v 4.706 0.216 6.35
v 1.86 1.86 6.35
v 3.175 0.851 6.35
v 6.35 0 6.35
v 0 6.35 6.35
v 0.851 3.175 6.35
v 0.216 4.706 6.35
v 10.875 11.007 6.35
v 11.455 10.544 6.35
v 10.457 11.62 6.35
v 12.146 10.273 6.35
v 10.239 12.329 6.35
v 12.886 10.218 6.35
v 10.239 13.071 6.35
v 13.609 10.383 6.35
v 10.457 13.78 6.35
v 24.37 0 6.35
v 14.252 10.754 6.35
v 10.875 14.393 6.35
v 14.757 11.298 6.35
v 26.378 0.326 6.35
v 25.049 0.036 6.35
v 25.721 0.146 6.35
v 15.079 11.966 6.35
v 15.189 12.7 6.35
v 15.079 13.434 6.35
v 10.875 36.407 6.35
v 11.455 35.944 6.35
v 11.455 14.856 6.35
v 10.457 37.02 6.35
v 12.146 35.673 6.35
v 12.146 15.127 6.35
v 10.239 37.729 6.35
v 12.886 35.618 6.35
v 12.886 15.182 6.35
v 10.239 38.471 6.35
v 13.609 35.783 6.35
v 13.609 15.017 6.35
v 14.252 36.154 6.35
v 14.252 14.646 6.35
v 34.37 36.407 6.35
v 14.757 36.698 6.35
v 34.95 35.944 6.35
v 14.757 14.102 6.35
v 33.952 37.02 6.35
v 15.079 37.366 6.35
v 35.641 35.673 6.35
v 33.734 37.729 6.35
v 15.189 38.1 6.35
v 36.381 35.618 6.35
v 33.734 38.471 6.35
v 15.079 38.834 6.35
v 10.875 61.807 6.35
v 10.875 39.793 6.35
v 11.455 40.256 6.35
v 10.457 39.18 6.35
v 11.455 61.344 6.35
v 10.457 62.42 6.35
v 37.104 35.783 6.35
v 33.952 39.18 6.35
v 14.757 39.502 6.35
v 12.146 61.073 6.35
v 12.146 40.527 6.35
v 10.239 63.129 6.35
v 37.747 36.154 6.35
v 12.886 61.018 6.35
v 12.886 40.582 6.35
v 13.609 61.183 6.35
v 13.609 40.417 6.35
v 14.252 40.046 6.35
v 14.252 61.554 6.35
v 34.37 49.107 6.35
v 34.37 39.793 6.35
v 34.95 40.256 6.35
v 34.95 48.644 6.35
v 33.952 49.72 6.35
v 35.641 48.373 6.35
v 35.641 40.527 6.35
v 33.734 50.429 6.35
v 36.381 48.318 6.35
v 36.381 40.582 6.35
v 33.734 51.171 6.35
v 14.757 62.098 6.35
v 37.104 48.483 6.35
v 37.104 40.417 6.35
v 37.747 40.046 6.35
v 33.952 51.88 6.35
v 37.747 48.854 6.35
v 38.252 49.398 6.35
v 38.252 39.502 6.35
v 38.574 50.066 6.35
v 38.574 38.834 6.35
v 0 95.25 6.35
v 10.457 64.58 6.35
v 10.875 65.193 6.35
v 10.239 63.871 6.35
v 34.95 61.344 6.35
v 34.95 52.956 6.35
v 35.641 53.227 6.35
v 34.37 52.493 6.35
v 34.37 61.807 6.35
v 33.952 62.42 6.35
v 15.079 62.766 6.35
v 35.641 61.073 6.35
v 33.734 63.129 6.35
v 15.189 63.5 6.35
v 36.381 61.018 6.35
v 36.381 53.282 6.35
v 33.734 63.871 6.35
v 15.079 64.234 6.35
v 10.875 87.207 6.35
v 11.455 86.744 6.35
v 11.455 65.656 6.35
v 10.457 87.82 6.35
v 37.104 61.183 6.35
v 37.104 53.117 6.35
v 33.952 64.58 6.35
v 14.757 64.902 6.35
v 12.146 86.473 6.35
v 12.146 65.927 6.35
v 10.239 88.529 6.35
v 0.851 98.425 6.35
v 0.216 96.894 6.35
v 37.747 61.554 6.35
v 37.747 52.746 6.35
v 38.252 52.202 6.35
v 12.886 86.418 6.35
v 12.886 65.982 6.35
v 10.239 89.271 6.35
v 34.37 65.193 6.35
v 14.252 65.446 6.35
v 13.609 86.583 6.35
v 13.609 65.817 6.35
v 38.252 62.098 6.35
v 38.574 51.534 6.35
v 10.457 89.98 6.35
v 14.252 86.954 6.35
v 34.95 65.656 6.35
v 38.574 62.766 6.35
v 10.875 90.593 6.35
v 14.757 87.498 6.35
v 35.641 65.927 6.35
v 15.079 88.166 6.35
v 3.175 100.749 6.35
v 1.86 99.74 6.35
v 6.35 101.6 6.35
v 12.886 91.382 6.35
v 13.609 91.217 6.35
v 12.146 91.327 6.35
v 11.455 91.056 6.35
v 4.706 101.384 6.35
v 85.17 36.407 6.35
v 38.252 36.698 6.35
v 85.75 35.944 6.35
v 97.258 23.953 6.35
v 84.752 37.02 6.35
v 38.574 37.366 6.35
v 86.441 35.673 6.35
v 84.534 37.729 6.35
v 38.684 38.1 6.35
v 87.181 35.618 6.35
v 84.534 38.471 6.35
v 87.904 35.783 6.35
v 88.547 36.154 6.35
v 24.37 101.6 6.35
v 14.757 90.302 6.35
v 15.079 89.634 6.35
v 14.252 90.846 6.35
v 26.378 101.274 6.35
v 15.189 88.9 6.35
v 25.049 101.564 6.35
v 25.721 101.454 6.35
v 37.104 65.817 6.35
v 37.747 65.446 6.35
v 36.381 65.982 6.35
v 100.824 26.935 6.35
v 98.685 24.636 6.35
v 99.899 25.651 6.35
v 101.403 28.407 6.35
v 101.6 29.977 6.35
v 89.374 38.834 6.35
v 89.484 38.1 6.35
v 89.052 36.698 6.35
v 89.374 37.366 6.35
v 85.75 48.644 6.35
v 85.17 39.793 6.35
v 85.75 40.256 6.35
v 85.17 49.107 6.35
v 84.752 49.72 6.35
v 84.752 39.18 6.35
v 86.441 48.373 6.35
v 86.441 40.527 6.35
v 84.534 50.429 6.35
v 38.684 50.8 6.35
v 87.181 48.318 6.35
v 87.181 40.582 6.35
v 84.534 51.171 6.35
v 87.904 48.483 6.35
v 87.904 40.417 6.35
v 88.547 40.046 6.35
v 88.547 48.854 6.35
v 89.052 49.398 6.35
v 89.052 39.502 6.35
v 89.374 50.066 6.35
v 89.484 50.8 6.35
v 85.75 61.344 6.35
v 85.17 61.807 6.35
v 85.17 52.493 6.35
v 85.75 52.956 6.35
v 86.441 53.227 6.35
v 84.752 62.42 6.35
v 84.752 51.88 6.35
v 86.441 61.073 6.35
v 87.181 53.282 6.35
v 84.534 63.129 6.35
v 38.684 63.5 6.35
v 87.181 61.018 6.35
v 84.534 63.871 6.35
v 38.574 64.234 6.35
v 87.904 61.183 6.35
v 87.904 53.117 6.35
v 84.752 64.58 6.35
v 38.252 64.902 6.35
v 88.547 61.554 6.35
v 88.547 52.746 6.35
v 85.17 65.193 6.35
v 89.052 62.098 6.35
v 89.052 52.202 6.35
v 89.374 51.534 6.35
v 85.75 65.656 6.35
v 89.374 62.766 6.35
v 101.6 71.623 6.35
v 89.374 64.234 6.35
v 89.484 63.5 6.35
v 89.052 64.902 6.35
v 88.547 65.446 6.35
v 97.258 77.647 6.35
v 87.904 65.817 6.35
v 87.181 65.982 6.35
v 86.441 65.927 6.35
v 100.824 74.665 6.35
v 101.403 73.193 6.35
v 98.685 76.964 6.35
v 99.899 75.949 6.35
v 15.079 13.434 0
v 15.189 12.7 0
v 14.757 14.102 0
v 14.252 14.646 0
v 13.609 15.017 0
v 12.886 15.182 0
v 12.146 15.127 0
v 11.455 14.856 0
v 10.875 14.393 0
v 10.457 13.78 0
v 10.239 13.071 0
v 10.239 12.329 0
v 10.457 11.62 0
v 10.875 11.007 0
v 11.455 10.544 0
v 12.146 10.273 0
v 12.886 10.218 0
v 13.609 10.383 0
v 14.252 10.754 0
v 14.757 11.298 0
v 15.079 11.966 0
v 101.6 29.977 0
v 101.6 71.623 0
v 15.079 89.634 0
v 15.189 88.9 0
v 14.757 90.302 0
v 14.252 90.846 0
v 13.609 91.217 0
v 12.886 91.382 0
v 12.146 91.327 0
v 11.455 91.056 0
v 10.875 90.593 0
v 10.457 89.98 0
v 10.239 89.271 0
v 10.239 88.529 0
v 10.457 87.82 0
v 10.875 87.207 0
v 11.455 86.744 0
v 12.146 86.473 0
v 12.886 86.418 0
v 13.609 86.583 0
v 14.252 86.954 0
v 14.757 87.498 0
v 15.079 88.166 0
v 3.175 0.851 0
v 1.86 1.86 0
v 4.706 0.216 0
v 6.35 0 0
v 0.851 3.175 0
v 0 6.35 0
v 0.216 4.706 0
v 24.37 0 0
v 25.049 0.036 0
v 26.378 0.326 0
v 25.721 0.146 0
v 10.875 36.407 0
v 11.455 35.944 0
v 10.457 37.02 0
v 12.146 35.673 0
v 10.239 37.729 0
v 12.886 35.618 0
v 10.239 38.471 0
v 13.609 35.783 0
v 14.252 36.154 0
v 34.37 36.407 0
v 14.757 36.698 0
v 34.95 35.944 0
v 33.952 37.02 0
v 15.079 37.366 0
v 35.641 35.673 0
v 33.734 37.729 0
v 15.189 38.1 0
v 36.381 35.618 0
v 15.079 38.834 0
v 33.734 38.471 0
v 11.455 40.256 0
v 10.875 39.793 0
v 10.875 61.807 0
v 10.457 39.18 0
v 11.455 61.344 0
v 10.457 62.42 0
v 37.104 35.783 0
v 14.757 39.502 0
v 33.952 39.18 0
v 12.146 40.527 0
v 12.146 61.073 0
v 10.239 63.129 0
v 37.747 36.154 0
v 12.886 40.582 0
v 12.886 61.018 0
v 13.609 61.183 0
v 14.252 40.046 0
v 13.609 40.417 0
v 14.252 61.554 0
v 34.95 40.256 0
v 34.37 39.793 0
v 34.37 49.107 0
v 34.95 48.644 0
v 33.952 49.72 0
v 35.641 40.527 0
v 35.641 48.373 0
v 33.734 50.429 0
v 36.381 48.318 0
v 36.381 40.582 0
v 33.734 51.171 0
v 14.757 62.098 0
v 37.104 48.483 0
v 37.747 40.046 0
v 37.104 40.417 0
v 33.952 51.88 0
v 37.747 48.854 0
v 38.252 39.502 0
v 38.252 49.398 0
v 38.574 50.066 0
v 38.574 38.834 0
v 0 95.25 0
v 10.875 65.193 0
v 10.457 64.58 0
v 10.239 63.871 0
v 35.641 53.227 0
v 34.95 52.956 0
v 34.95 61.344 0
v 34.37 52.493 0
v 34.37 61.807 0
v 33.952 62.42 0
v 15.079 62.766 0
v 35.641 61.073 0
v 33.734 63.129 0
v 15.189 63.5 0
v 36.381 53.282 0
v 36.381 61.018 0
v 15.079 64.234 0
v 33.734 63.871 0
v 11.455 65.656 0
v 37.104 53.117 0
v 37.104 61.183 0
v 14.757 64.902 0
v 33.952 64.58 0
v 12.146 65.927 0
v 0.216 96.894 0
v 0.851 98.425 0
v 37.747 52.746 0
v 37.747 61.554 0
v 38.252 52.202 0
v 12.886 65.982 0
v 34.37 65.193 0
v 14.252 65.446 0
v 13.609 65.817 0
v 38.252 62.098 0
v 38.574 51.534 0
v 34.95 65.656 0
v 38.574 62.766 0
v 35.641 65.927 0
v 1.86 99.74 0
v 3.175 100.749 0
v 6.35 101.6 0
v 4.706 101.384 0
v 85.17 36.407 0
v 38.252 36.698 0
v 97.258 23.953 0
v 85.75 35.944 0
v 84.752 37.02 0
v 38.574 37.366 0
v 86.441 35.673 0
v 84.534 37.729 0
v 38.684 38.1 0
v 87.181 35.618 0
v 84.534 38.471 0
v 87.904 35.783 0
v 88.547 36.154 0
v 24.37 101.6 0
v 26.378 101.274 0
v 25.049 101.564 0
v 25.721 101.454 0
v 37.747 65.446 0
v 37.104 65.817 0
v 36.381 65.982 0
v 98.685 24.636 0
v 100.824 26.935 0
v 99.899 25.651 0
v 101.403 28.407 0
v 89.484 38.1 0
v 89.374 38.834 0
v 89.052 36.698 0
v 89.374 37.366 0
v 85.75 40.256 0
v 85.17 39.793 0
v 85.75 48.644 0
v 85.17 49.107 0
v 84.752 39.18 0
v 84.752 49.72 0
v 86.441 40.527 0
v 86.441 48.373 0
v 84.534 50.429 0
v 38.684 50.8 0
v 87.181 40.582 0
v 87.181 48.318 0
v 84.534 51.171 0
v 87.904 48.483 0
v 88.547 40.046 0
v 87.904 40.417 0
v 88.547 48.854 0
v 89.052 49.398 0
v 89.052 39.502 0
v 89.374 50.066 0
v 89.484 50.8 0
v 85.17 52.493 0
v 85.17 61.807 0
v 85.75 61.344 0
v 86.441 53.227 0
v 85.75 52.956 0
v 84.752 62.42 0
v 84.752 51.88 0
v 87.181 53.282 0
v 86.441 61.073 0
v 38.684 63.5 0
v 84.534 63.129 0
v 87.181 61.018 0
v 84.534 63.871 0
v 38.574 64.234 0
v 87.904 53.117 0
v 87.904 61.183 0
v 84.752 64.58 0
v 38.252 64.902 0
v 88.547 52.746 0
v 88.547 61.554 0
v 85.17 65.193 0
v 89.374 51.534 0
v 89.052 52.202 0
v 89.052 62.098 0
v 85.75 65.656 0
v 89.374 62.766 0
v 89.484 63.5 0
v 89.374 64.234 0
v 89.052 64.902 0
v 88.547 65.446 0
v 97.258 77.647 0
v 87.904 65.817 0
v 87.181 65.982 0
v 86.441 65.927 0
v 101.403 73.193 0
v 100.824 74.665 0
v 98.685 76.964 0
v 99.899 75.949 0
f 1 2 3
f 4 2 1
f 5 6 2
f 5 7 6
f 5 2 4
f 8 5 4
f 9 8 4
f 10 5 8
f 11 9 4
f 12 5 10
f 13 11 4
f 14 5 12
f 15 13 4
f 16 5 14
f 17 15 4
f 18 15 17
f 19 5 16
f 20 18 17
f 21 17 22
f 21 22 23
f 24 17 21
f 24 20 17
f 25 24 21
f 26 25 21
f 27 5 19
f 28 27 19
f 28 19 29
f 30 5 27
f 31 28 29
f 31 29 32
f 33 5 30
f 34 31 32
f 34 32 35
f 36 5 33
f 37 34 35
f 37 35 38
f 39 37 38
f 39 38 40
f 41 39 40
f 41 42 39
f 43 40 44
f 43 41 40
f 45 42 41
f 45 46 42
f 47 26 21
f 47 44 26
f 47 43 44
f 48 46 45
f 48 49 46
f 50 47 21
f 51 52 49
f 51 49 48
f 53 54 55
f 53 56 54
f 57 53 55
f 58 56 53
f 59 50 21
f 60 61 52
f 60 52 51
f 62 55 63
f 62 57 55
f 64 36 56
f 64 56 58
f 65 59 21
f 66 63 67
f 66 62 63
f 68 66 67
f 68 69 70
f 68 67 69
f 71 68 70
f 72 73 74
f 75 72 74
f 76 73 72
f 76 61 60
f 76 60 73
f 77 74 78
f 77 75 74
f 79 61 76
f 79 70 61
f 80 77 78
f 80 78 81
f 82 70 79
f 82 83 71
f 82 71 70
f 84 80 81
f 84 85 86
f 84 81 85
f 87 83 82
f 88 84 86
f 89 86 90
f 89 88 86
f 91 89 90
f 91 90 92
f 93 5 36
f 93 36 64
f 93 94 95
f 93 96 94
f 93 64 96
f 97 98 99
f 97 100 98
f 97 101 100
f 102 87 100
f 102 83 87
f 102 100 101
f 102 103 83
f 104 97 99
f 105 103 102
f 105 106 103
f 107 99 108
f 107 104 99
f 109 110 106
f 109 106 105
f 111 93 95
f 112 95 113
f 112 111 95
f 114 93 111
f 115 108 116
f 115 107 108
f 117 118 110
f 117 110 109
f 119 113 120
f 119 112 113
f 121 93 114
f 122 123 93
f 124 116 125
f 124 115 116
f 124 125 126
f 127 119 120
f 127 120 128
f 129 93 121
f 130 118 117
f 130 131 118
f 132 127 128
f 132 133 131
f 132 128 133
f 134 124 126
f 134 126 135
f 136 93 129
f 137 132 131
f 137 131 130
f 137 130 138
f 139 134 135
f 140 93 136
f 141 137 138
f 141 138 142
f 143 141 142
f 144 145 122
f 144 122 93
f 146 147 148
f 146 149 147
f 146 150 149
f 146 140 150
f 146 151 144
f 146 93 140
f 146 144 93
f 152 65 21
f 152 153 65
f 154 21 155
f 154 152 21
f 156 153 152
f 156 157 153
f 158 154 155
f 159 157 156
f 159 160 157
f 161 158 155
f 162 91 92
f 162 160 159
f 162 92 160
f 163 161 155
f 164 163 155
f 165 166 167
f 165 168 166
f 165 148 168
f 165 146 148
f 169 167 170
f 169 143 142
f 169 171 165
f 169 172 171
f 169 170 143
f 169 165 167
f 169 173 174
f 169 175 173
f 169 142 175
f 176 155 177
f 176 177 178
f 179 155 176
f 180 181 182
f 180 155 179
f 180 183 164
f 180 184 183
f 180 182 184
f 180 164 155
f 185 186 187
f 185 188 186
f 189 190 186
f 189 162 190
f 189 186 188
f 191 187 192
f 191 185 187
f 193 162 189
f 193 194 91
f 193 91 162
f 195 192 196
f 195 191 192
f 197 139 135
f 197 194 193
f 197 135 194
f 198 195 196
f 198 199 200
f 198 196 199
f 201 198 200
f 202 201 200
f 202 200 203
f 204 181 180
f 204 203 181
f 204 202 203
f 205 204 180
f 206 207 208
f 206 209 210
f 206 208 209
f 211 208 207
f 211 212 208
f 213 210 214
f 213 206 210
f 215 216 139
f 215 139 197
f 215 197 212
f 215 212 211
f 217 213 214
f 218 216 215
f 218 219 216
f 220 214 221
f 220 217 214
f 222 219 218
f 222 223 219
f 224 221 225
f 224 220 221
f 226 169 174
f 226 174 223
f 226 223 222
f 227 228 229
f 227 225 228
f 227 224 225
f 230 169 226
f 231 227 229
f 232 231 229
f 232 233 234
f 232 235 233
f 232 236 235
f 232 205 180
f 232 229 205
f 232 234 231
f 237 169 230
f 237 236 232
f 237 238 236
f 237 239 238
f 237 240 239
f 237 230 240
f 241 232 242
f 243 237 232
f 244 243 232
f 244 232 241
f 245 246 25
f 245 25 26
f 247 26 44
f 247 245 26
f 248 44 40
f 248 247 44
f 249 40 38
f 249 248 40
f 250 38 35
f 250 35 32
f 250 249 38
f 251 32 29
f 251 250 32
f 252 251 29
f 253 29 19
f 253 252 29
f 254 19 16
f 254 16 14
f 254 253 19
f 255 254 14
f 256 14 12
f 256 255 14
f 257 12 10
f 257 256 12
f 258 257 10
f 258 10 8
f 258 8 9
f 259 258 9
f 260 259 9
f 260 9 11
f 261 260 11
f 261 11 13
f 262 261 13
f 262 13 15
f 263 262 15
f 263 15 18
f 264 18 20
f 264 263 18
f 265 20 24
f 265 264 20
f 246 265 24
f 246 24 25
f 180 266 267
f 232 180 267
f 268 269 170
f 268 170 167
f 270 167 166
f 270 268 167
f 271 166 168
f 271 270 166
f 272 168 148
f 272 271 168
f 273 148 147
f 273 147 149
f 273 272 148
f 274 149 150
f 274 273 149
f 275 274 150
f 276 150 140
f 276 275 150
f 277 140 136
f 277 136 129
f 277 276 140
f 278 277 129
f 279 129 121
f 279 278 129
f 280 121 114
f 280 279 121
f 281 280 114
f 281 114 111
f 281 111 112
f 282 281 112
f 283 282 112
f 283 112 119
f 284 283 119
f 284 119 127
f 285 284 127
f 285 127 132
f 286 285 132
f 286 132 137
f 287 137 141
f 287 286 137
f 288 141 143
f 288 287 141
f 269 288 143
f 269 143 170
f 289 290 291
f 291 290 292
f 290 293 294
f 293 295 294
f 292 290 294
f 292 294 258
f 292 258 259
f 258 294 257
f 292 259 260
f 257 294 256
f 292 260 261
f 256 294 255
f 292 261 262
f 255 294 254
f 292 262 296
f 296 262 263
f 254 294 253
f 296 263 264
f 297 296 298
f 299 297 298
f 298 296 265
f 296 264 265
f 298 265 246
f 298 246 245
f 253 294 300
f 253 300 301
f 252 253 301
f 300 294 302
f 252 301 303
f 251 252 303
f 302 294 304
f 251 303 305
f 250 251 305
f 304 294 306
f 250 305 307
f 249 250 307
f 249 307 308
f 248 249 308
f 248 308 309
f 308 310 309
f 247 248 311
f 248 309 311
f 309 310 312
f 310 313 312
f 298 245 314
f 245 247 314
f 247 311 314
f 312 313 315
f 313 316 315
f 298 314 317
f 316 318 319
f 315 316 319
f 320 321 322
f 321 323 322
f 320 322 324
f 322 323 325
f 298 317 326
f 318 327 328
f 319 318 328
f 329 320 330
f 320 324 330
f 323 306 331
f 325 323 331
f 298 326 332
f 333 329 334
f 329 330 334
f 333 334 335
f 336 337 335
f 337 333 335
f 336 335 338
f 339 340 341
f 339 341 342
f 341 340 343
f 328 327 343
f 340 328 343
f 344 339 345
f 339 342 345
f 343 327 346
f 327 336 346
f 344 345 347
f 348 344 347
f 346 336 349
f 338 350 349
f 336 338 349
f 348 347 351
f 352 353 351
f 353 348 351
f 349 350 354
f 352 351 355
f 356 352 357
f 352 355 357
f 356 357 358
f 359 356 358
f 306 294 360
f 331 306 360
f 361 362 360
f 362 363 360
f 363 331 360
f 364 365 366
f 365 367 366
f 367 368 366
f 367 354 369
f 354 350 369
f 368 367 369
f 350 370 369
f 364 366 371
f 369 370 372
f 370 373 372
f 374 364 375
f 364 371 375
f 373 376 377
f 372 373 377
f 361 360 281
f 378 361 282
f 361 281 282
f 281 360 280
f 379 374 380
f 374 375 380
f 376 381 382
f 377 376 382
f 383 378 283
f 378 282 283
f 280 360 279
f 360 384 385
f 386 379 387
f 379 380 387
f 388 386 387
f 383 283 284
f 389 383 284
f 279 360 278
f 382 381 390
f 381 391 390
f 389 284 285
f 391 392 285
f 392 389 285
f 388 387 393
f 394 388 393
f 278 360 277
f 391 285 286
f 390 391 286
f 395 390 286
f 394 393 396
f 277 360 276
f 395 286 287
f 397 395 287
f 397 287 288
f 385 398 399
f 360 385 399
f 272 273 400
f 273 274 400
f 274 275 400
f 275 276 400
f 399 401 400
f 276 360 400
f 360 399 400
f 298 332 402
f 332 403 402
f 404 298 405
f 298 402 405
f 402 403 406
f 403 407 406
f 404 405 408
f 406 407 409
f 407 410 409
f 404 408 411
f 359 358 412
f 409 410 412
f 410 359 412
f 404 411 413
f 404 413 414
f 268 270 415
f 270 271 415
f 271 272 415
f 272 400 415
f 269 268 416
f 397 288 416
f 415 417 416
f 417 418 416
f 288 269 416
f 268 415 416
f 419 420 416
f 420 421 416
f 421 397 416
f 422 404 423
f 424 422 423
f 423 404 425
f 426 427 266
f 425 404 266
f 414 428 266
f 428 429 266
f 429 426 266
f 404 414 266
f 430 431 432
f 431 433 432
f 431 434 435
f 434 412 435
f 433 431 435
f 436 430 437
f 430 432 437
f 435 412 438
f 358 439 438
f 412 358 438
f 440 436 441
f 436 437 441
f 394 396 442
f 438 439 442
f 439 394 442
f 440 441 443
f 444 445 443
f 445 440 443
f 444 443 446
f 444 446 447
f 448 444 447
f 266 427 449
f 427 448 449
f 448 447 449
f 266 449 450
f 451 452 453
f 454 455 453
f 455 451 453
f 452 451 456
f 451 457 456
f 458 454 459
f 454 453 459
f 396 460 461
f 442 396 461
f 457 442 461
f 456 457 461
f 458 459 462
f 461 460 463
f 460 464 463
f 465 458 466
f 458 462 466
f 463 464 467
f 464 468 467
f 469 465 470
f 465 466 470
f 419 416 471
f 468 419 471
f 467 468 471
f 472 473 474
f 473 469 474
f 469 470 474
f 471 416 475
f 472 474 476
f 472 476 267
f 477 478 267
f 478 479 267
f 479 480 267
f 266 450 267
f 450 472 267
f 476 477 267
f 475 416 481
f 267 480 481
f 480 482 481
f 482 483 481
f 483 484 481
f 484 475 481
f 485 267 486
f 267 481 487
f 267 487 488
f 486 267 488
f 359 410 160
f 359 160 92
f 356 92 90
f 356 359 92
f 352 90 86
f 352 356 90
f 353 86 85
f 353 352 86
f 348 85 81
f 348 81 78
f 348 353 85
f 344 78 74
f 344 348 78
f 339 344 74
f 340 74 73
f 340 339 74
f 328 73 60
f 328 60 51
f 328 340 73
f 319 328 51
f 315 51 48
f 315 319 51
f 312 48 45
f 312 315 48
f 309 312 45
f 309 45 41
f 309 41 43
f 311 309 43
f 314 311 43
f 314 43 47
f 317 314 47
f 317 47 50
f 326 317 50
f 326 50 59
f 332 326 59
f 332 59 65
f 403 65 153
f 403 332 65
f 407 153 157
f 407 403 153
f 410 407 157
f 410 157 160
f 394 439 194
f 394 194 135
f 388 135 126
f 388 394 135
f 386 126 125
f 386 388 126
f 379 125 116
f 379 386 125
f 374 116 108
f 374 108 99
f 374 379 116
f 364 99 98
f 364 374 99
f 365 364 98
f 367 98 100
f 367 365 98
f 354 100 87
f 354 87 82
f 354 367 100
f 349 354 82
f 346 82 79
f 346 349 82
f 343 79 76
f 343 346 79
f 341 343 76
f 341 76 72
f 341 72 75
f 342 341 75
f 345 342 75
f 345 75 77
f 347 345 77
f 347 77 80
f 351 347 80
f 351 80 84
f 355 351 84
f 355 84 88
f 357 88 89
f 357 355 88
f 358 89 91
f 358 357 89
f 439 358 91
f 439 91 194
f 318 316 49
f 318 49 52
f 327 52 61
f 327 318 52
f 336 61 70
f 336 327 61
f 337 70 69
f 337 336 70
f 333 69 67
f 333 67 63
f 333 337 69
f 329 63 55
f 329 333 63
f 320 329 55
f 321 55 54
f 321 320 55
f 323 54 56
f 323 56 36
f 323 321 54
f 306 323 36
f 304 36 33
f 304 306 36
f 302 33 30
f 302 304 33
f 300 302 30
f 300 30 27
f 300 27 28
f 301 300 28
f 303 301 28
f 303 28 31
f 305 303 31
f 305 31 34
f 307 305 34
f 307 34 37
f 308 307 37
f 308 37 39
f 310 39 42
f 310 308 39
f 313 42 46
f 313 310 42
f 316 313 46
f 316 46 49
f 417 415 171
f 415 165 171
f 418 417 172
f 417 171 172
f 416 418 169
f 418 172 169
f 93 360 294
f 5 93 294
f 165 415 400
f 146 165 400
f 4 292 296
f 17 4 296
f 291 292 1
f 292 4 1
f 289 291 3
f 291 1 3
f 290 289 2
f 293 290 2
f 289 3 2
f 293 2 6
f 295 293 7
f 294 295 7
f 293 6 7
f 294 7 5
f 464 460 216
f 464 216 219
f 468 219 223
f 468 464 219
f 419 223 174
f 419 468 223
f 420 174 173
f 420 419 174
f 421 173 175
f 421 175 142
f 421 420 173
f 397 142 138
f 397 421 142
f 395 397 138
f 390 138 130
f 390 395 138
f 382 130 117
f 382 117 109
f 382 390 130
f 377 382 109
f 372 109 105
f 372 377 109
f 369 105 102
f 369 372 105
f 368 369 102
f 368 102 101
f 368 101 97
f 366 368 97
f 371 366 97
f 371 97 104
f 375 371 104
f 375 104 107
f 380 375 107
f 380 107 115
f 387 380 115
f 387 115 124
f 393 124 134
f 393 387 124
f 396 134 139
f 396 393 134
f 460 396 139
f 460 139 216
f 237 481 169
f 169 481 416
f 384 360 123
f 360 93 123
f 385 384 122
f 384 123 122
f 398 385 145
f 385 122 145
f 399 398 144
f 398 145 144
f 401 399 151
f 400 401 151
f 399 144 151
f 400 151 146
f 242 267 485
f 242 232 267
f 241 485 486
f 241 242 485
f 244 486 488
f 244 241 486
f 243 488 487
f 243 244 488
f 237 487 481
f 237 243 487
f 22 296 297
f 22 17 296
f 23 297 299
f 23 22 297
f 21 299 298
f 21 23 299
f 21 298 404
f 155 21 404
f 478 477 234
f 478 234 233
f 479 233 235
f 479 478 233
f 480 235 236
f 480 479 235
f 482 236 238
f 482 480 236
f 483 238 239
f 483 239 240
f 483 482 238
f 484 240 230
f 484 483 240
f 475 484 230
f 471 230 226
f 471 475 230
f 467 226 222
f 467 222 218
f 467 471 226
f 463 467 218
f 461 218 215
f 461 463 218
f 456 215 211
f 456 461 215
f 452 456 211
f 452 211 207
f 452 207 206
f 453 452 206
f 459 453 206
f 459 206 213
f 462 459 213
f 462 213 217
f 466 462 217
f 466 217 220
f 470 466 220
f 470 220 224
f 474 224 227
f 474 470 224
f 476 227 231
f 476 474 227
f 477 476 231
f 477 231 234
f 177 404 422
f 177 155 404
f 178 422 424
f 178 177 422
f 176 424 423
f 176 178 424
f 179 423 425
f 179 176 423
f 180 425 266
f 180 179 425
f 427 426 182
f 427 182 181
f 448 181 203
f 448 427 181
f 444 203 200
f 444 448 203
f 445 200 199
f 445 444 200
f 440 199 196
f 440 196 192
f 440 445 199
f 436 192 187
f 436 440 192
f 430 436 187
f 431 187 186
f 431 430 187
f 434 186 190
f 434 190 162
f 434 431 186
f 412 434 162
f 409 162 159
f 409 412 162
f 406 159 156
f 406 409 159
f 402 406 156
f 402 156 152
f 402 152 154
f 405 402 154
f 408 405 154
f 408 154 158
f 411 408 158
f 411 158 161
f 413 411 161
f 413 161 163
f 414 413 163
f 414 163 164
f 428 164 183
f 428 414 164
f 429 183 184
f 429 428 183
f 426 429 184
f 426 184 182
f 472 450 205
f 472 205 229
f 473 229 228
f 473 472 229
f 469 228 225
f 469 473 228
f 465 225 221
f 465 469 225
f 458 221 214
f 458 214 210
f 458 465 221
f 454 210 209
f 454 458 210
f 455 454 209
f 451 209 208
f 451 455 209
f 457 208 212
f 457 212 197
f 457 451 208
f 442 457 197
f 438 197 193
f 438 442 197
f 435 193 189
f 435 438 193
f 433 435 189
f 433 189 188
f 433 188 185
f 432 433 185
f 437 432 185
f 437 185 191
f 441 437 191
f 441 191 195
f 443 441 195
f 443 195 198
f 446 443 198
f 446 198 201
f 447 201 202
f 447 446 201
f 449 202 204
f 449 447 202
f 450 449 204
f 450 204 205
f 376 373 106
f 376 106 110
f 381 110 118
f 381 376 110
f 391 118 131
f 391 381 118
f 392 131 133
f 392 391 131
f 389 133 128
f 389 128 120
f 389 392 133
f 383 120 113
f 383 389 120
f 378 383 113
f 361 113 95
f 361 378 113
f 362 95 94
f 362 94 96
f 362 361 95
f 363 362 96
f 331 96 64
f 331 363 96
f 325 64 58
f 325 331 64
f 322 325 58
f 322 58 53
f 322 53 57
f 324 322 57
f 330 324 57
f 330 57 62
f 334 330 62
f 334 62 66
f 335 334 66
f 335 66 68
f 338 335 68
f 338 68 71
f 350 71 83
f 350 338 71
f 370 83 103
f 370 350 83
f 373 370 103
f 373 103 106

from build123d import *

# Parameters (mm, degrees)
SKETCH1_R           = 2.4892
BOSS_EXTRUDE1_DEPTH = 6.35
FILLET1_R           = 6.35


with BuildPart() as part:
    # Sketch1 → Boss-Extrude1 (new body)
    with BuildSketch(Plane.XY):
        Polygon((0, 0), (25.4, 0), (101.6, 25.4), (101.6, 76.2), (25.4, 101.6), (0, 101.6), align=None)
        with Locations((36.195, 63.5)):
            Circle(SKETCH1_R, mode=Mode.SUBTRACT)
        with Locations((86.995, 63.5)):
            Circle(SKETCH1_R, mode=Mode.SUBTRACT)
        with Locations((86.995, 50.8)):
            Circle(SKETCH1_R, mode=Mode.SUBTRACT)
        with Locations((86.995, 38.1)):
            Circle(SKETCH1_R, mode=Mode.SUBTRACT)
        with Locations((36.195, 50.8)):
            Circle(SKETCH1_R, mode=Mode.SUBTRACT)
        with Locations((36.195, 38.1)):
            Circle(SKETCH1_R, mode=Mode.SUBTRACT)
        with Locations((12.7, 88.9)):
            Circle(SKETCH1_R, mode=Mode.SUBTRACT)
        with Locations((12.7, 63.5)):
            Circle(SKETCH1_R, mode=Mode.SUBTRACT)
        with Locations((12.7, 38.1)):
            Circle(SKETCH1_R, mode=Mode.SUBTRACT)
        with Locations((12.7, 12.7)):
            Circle(SKETCH1_R, mode=Mode.SUBTRACT)
    extrude(amount=BOSS_EXTRUDE1_DEPTH)

    # Fillet1
    fillet1_edges = [part.edges().sort_by_distance(p)[0] for p in [
        (0, 0, 3.175),
        (25.4, 0, 3.175),
        (101.6, 25.4, 3.175),
        (101.6, 76.2, 3.175),
        (25.4, 101.6, 3.175),
        (0, 101.6, 3.175),
    ]]
    fillet(fillet1_edges, radius=FILLET1_R)


solid = part.part
